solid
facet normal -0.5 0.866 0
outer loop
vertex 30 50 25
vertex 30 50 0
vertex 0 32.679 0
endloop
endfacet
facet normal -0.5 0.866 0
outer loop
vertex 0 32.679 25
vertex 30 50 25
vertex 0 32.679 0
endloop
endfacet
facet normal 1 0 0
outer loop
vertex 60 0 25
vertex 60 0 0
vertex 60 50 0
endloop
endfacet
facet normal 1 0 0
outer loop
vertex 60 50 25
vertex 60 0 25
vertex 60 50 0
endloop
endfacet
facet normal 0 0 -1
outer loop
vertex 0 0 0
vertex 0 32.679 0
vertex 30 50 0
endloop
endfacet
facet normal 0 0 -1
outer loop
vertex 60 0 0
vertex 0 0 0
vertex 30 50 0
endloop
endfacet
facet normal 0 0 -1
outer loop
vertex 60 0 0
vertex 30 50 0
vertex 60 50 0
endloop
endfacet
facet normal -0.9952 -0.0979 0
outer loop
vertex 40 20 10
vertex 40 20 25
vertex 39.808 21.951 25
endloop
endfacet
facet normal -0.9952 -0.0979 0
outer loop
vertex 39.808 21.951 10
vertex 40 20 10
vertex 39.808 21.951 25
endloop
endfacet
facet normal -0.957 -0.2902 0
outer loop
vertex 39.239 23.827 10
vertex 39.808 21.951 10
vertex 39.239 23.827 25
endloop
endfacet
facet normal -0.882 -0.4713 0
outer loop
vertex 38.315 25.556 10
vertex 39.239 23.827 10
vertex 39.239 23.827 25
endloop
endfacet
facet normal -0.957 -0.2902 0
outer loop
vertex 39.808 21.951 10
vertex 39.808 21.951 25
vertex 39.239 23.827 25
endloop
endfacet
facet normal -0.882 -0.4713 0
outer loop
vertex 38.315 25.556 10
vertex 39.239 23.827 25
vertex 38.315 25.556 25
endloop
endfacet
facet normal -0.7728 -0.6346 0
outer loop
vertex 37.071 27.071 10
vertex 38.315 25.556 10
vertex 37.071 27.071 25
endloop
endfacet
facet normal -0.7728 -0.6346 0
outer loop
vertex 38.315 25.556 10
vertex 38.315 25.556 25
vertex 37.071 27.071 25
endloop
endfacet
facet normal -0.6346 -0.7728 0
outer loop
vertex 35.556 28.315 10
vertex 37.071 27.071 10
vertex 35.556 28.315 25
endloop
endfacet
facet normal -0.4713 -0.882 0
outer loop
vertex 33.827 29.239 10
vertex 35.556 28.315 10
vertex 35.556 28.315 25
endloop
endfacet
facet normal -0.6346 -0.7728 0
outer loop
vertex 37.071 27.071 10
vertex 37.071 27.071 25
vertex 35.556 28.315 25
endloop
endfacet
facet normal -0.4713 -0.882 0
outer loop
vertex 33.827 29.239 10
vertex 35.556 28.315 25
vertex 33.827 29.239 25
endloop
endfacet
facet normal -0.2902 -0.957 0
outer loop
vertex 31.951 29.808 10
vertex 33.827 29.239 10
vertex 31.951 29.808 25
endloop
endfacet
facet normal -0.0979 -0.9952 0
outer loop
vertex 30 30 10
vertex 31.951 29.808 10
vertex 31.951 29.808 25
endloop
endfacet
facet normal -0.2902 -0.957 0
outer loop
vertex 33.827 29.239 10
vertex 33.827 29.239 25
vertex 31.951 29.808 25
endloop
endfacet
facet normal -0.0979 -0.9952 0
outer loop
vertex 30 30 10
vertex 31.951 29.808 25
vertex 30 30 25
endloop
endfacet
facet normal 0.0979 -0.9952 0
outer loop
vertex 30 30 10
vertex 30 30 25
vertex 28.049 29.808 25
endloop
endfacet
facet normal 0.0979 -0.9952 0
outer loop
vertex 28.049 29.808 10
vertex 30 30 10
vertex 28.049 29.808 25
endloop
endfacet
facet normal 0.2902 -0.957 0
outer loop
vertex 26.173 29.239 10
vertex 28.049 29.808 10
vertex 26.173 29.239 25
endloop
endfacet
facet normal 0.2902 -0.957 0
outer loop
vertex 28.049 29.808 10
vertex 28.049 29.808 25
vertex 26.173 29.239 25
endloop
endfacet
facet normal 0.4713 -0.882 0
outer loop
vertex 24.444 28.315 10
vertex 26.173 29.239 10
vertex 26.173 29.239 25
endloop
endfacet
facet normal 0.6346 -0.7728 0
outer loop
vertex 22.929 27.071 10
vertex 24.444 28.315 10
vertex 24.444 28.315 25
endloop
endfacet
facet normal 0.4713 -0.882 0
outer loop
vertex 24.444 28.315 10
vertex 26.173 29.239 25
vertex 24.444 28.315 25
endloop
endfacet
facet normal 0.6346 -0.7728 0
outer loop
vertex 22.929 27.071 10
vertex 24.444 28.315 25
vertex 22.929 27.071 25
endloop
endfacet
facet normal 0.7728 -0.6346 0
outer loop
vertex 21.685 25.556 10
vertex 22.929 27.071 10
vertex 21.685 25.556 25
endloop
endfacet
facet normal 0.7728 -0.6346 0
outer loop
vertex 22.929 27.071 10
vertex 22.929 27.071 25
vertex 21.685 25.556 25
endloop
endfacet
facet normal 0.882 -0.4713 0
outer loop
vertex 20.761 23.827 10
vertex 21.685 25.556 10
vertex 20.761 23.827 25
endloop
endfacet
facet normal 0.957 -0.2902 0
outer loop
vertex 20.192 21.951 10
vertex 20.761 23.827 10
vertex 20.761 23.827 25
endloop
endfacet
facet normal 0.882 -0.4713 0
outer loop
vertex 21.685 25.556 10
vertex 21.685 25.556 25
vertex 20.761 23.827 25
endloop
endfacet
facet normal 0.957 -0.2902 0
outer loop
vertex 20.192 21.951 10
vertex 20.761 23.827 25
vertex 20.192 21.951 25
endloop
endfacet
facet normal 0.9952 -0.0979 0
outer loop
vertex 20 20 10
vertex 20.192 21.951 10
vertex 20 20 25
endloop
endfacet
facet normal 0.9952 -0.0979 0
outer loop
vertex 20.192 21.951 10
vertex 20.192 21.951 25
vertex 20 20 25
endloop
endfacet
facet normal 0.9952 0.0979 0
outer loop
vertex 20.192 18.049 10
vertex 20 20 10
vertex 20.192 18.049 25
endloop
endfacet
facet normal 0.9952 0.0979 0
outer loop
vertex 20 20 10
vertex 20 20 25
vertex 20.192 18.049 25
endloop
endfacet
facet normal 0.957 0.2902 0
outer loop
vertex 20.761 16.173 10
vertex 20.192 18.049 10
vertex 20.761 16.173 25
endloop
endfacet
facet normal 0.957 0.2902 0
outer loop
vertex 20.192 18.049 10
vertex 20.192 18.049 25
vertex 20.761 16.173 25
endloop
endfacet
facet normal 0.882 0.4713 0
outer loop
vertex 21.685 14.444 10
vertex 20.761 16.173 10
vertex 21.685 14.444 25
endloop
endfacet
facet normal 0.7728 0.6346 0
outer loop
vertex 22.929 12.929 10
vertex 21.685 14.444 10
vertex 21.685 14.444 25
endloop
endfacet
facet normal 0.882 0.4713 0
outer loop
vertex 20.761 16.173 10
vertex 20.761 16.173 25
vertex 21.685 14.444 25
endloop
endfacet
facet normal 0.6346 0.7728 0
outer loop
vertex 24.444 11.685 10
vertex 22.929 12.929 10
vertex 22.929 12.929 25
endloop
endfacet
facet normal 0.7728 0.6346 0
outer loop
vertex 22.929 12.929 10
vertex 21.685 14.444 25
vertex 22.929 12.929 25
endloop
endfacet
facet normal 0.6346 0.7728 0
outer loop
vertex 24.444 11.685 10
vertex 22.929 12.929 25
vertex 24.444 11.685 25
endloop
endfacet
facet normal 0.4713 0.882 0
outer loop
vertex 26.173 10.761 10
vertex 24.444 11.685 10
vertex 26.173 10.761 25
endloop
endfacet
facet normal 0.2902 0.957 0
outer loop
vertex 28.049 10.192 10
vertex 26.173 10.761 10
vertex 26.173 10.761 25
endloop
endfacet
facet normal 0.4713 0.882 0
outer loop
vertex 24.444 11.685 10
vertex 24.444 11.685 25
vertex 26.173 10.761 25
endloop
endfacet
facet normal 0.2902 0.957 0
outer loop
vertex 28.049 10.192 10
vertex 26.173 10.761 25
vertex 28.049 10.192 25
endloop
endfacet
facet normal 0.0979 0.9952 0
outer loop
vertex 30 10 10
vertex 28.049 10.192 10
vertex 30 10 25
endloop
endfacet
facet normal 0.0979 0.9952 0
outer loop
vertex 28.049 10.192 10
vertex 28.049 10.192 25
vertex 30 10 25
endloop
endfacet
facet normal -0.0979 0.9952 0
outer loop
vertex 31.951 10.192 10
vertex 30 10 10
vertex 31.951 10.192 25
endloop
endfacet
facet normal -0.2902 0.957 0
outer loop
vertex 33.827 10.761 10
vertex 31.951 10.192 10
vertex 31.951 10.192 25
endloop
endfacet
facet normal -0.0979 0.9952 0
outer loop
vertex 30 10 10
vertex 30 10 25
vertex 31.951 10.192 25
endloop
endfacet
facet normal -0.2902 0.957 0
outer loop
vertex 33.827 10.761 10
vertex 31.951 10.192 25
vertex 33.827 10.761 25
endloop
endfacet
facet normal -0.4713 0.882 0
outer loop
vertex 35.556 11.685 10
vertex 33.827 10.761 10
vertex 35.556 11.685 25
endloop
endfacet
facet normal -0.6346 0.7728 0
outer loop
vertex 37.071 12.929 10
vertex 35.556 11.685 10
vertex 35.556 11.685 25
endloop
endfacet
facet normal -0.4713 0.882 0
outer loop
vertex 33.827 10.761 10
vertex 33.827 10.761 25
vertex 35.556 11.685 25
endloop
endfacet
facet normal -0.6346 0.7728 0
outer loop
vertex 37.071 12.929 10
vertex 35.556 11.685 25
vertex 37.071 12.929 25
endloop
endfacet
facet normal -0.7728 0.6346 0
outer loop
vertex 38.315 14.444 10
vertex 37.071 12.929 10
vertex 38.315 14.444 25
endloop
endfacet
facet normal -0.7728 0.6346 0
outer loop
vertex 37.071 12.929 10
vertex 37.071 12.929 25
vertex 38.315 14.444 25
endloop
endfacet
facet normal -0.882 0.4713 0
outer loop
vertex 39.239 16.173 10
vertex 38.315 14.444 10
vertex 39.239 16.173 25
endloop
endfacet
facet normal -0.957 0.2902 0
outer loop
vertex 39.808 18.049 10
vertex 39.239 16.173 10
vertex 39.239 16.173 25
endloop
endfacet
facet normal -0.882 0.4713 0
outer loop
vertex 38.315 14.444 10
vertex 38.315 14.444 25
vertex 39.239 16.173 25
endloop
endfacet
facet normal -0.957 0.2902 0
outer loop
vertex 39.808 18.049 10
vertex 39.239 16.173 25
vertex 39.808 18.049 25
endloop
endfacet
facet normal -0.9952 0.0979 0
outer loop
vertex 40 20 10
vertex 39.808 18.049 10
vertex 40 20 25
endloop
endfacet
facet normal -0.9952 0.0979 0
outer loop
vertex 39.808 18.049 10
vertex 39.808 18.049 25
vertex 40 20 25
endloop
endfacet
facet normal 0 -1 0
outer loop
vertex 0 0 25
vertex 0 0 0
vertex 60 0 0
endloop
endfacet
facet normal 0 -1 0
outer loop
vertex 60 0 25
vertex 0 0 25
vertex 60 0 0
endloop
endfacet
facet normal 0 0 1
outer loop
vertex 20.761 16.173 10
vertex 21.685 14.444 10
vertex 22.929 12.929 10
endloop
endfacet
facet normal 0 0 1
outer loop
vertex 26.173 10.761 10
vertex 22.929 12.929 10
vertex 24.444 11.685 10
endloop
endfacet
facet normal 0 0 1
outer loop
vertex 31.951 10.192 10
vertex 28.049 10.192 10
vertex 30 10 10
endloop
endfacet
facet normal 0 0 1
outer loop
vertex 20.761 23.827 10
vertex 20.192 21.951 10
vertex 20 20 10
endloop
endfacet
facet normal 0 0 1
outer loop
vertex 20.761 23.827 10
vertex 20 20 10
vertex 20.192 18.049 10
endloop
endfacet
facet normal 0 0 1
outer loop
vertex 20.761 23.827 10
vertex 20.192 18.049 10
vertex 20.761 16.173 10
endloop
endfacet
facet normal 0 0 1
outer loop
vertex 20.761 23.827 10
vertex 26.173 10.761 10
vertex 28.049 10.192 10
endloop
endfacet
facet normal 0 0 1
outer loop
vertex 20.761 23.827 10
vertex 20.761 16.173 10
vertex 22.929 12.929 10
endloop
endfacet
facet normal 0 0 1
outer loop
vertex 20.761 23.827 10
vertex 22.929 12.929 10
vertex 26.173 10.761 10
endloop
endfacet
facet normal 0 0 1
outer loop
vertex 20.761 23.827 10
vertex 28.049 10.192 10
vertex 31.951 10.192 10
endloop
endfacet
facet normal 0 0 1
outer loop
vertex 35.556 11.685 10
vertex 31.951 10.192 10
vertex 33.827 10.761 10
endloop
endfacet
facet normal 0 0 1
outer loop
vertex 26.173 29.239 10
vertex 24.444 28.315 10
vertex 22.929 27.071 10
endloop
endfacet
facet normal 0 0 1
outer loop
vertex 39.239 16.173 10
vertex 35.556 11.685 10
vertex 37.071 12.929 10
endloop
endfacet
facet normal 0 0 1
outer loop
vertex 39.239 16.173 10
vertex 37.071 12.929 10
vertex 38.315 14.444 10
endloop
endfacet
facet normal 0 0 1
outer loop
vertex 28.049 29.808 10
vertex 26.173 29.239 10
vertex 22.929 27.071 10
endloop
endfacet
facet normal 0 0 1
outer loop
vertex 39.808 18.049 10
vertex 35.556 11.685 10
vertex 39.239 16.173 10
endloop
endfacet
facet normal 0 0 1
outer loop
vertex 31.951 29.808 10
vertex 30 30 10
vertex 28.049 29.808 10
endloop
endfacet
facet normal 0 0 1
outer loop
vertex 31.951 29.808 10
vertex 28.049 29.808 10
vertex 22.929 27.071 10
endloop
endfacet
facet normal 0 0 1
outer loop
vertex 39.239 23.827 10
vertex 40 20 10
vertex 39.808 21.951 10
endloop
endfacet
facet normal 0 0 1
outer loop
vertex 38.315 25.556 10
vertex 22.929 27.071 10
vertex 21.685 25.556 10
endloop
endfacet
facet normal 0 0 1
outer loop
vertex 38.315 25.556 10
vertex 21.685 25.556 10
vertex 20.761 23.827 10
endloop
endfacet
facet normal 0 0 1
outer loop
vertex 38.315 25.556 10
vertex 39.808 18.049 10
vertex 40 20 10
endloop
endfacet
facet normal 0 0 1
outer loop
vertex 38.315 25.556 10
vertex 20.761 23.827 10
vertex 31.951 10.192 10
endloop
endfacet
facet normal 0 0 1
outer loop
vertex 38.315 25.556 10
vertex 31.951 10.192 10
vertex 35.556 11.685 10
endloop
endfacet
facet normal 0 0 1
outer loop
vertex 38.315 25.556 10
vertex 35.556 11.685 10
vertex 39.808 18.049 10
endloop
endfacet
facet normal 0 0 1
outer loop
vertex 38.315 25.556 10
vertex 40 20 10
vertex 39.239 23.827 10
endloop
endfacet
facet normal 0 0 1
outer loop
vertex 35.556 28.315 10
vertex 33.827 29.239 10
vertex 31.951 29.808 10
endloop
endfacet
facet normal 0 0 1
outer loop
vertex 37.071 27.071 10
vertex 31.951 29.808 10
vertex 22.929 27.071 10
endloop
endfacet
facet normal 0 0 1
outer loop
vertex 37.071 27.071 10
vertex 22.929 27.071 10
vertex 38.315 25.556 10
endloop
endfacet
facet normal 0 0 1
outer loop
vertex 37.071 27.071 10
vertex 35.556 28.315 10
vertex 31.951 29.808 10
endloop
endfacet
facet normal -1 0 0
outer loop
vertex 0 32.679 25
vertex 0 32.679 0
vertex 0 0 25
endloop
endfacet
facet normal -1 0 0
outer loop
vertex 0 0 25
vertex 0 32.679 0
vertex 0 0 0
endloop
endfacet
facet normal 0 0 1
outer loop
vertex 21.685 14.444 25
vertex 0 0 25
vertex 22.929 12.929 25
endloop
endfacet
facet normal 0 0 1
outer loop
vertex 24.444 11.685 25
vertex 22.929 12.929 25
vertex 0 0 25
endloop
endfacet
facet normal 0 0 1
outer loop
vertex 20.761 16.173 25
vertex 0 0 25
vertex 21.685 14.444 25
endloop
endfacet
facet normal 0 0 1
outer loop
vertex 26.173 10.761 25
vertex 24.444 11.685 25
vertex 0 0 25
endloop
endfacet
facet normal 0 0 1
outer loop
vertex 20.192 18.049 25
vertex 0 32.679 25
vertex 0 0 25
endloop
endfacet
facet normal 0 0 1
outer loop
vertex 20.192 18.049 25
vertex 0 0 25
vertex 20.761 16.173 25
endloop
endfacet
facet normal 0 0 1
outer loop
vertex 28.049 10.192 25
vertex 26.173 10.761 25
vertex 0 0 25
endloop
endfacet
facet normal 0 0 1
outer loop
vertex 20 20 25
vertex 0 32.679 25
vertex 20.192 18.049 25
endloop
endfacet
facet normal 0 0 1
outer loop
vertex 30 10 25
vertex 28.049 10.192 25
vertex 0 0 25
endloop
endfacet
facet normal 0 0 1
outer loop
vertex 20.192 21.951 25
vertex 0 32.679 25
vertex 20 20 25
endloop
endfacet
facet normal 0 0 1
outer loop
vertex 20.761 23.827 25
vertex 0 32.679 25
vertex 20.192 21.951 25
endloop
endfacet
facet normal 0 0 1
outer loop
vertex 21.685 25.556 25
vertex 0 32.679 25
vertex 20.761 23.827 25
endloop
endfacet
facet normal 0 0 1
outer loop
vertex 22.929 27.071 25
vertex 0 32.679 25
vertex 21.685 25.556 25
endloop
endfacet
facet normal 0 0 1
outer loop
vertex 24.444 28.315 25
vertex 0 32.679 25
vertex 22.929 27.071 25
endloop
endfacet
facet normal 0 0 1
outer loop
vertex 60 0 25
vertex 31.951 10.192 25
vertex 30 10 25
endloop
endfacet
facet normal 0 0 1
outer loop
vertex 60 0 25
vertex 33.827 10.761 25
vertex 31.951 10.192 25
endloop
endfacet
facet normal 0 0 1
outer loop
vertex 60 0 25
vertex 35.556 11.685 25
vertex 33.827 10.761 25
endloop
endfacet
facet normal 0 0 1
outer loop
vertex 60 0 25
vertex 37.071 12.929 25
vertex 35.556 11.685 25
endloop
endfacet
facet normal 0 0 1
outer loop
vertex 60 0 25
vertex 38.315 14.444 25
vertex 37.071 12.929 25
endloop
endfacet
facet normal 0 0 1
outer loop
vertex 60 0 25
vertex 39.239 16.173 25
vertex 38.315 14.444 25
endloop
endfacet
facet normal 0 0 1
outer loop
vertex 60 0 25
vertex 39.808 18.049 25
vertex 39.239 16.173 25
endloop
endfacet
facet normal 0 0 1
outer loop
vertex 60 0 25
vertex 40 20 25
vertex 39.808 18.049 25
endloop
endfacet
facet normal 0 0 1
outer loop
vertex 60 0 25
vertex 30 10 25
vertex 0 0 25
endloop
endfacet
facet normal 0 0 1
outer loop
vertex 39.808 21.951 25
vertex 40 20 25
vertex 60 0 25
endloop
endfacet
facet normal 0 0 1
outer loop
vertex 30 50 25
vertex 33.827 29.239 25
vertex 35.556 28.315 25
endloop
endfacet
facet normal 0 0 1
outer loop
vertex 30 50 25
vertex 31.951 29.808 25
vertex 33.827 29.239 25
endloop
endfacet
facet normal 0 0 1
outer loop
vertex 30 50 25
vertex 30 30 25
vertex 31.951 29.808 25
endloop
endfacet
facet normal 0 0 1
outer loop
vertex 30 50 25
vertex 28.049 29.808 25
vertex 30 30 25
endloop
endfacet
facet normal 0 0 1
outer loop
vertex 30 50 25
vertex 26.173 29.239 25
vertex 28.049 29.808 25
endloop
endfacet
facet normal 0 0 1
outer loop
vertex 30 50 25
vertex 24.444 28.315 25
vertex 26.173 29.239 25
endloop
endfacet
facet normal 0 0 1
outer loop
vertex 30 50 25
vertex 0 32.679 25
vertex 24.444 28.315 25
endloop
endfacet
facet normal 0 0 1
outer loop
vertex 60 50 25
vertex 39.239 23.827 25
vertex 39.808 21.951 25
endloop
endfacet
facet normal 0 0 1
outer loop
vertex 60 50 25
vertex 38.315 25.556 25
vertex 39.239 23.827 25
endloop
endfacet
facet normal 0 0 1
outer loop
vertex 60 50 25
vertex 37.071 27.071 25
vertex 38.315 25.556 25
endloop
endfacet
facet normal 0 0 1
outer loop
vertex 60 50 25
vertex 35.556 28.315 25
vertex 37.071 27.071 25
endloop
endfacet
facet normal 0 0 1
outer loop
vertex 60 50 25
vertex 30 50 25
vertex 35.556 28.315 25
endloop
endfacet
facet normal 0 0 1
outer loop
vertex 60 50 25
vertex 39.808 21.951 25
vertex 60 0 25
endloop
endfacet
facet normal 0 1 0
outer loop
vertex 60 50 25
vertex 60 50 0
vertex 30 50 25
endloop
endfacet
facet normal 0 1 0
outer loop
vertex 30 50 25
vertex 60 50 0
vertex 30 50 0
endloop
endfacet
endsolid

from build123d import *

# Parameters (mm, degrees)
F1_DEPTH = 25
F2_R     = 10
F3_DEPTH = 15


with BuildPart() as f1:
    # F0 (on Top) → F1 (new body)
    with BuildSketch(Plane.XY):
        Polygon((0, 32.679492), (0, 0), (60, 0), (60, 50), (30, 50), align=None)
    extrude(amount=F1_DEPTH)

    # F2 (on face) → F3 (cut)
    with BuildSketch(Plane.XY.offset(25)):
        with Locations((30, 20)):
            Circle(F2_R)
    extrude(amount=-F3_DEPTH, mode=Mode.SUBTRACT)


solid = f1.part
